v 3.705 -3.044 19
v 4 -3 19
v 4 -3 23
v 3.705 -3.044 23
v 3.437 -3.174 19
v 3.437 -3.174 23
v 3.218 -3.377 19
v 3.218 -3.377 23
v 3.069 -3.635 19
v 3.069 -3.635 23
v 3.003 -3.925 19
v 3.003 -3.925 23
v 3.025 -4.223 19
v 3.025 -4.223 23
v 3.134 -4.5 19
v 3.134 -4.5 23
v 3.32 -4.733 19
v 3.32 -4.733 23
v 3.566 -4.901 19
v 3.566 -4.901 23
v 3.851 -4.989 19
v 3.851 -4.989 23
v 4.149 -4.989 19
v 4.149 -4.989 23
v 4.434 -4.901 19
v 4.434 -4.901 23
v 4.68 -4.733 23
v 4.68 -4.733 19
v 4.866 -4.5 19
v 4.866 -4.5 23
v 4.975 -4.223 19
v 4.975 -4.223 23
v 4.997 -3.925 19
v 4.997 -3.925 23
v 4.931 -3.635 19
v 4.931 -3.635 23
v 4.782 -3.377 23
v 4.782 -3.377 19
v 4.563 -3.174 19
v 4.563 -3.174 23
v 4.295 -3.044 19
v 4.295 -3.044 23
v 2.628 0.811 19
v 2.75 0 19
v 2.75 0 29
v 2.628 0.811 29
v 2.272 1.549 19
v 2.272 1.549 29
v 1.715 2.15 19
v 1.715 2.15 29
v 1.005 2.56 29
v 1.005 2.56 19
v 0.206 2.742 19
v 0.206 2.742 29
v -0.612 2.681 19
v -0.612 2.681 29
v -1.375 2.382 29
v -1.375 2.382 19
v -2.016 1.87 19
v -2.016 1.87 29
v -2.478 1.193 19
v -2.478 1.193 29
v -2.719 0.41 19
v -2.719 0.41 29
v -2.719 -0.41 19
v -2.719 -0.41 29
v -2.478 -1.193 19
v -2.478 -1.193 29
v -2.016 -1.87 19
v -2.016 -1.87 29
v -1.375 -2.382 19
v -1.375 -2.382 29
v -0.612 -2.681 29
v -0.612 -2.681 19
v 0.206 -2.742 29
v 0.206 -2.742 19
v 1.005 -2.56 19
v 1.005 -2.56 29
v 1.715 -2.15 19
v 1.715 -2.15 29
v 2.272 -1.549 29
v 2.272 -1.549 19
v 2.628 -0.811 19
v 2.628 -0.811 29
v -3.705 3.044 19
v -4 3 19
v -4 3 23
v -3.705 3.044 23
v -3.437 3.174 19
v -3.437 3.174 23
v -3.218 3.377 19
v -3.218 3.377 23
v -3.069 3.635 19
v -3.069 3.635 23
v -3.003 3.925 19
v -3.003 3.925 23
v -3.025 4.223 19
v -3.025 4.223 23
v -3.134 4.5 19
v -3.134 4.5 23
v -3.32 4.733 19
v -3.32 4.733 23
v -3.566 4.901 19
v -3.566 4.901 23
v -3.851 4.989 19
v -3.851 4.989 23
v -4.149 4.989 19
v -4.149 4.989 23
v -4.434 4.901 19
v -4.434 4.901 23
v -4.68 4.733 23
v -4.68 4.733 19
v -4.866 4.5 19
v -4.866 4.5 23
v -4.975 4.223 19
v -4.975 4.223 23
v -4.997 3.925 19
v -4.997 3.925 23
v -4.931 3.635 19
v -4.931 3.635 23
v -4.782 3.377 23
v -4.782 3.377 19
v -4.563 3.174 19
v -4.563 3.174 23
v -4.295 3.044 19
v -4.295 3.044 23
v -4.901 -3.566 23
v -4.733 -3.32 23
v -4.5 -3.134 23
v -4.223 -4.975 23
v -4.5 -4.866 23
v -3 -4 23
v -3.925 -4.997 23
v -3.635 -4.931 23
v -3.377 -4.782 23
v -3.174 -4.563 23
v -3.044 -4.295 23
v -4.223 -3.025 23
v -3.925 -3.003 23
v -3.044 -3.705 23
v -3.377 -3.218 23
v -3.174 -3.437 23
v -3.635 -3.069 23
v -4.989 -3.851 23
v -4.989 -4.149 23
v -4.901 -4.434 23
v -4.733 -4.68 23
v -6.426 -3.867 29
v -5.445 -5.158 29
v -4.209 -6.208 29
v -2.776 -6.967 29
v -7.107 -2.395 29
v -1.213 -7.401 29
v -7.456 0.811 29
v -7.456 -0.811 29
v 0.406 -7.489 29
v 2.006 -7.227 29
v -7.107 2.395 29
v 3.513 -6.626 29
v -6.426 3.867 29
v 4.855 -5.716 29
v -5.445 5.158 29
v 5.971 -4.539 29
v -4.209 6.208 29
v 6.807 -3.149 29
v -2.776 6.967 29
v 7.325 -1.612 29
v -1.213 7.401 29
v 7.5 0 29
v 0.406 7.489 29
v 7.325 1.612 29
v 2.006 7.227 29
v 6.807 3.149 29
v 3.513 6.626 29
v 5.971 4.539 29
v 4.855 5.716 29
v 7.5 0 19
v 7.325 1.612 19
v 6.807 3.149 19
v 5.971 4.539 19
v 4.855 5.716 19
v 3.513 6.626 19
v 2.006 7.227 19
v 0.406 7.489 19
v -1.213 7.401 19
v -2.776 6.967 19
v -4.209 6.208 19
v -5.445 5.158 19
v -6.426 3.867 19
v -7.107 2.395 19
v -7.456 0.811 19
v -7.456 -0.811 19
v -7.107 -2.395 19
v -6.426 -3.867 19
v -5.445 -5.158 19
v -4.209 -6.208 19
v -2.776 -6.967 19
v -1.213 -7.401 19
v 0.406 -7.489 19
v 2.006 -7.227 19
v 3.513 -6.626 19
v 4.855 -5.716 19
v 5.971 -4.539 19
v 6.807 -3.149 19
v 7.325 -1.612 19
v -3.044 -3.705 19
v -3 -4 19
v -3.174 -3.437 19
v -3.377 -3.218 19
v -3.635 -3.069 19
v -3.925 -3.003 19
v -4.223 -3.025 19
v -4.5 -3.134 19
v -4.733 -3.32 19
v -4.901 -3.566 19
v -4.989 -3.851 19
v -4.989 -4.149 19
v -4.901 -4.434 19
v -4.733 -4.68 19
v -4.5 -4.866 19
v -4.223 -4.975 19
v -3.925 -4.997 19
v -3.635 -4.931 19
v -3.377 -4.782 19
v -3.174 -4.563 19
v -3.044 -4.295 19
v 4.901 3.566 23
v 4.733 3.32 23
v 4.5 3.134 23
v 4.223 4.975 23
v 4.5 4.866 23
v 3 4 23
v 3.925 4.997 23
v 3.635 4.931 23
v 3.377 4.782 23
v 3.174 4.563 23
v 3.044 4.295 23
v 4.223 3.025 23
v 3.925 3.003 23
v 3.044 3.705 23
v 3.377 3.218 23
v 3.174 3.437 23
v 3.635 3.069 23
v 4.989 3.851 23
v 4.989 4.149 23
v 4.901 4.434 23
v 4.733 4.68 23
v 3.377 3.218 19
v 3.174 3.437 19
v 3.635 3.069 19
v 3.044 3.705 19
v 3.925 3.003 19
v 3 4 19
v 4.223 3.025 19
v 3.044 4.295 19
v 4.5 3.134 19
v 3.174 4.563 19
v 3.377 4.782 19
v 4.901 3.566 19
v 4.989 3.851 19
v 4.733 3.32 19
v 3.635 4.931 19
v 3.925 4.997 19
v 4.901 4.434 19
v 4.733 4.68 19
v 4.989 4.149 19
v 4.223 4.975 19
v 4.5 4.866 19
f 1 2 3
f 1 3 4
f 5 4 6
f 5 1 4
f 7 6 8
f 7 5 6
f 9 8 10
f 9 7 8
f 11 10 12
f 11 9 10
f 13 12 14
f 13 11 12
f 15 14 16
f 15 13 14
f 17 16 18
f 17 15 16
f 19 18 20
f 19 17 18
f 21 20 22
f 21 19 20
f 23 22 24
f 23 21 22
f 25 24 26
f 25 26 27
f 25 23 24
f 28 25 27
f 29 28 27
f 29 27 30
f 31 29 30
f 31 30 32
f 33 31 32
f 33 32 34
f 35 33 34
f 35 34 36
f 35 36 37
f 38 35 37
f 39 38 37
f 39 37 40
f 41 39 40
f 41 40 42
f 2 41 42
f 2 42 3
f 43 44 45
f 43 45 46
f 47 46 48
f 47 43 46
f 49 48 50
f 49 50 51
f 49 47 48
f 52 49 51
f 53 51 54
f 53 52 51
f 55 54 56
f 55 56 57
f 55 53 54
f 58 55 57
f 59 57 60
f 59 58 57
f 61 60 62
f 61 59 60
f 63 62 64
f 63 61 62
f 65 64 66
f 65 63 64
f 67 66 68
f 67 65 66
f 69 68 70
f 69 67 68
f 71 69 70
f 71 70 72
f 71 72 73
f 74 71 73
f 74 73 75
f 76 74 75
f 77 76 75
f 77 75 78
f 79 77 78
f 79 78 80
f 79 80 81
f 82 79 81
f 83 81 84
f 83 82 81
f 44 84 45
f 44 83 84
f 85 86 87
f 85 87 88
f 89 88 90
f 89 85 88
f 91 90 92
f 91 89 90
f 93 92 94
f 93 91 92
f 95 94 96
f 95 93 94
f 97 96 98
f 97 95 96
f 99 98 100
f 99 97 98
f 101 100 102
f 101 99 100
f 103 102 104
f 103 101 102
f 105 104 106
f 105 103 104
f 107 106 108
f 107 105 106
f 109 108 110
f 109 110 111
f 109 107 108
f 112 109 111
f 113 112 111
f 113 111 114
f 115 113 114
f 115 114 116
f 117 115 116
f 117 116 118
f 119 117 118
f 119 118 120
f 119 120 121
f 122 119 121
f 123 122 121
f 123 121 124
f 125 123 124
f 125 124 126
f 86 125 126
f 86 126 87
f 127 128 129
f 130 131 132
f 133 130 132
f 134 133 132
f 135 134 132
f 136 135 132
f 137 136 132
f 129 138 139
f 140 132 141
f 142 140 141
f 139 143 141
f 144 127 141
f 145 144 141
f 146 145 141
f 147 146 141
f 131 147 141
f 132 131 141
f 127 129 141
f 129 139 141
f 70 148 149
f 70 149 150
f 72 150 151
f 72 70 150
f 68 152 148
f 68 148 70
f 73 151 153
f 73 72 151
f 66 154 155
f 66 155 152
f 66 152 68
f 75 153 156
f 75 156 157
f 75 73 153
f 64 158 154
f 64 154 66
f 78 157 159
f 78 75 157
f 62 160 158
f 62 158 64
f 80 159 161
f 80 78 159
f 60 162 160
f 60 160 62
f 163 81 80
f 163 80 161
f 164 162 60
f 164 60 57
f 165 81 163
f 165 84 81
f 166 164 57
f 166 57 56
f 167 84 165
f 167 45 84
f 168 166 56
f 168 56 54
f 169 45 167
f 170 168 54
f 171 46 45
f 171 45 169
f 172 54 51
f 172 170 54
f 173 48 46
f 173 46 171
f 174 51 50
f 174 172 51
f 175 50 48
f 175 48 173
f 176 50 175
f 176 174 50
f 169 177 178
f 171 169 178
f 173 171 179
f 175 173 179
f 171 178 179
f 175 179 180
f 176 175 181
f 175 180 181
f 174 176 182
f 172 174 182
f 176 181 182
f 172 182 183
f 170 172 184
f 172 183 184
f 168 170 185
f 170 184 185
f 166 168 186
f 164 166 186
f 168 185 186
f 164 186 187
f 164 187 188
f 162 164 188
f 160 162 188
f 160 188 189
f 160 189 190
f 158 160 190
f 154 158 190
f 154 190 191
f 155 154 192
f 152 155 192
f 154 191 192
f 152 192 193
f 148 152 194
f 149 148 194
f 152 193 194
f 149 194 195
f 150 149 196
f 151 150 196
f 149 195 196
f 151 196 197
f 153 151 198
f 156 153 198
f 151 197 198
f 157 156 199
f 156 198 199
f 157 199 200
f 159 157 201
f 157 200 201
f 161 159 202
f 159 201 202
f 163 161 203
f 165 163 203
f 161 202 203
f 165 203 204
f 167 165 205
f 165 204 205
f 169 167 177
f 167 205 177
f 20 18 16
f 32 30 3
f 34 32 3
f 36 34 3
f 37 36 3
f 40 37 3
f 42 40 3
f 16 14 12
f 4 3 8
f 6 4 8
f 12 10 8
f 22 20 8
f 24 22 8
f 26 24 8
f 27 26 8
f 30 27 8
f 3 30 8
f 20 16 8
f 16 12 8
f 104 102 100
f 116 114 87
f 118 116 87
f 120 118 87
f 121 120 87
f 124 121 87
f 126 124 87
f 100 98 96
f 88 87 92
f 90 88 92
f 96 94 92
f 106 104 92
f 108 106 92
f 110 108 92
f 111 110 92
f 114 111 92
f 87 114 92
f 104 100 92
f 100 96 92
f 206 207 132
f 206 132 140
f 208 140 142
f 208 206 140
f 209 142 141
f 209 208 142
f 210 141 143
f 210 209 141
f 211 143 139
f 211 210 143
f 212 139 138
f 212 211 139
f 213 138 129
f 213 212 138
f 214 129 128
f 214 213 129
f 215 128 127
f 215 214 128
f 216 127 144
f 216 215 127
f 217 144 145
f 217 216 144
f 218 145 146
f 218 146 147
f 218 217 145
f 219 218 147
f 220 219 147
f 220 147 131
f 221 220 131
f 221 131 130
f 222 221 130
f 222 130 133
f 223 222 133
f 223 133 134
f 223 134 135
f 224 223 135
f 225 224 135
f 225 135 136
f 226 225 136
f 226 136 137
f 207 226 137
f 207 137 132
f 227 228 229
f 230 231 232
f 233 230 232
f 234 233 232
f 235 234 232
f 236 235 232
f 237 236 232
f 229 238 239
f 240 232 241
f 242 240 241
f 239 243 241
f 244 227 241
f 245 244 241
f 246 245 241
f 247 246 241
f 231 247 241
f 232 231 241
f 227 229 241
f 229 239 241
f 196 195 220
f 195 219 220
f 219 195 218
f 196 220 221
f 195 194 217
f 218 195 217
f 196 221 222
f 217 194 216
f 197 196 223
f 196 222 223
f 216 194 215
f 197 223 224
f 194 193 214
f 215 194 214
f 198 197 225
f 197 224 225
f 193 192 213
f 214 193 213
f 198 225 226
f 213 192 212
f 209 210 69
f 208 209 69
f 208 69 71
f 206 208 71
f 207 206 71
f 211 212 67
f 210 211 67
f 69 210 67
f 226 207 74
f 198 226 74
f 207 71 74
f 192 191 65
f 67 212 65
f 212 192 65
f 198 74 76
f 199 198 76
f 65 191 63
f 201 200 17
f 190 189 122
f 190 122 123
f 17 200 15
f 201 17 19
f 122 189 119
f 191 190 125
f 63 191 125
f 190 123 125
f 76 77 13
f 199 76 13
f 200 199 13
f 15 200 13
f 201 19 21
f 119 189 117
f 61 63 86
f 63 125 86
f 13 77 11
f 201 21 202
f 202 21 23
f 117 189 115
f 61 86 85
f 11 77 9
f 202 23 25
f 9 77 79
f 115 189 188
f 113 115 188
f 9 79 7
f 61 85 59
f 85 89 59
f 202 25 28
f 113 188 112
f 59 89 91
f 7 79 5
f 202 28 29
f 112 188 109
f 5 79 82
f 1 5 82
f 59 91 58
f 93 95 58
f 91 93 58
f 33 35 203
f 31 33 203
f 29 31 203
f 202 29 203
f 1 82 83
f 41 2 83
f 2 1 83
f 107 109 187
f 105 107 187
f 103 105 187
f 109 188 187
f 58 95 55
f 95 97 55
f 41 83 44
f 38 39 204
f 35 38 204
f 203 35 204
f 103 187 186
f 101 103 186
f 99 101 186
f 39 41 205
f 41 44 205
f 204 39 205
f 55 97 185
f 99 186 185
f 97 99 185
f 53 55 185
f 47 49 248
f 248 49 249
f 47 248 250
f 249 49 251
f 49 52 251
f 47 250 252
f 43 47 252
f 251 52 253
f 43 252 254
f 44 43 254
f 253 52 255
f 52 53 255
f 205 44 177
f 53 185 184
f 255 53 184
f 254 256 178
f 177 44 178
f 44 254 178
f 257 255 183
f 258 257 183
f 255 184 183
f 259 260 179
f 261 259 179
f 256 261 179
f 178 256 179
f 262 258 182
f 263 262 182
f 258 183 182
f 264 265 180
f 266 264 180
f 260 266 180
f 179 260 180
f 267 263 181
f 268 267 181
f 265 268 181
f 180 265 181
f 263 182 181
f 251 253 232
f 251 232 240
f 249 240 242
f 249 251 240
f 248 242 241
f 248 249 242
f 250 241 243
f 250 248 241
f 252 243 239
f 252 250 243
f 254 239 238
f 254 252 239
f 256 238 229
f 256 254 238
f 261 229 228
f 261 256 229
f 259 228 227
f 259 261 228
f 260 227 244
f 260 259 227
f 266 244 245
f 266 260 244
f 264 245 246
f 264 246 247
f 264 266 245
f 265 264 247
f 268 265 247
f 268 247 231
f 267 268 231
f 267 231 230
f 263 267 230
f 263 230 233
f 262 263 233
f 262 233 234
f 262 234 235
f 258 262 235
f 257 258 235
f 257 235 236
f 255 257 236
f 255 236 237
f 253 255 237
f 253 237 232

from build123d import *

# Parameters (mm, degrees)
CYLINDER1349_R     = 1
CYLINDER1349_DEPTH = 20
CYLINDER1351_R     = 1
CYLINDER1351_DEPTH = 20
CYLINDER1352_R     = 1
CYLINDER1352_DEPTH = 20
CYLINDER1345_R     = 1
CYLINDER1345_DEPTH = 20
TUBE120_R          = 7.5
TUBE120_R_2        = 2.75
TUBE120_DEPTH      = 10


with BuildPart() as v_lec1349:
    # Cylinder1349 → Cylinder1349 (new body)
    with BuildSketch(Plane(origin=(4, -4, -88), x_dir=(0, 1, 0), z_dir=(0, 0, 1))):
        Circle(CYLINDER1349_R)
    extrude(amount=CYLINDER1349_DEPTH)


with BuildPart() as v_lec1351:
    # Cylinder1351 → Cylinder1351 (new body)
    with BuildSketch(Plane(origin=(4, 4, -88), x_dir=(-1, 0, 0), z_dir=(0, 0, 1))):
        Circle(CYLINDER1351_R)
    extrude(amount=CYLINDER1351_DEPTH)


with BuildPart() as v_lec1352:
    # Cylinder1352 → Cylinder1352 (new body)
    with BuildSketch(Plane(origin=(-4, 4, -88), x_dir=(0, -1, 0), z_dir=(0, 0, 1))):
        Circle(CYLINDER1352_R)
    extrude(amount=CYLINDER1352_DEPTH)


with BuildPart() as compound943:
    # Cylinder1345 → Cylinder1345 (new body)
    with BuildSketch(Plane(origin=(-4, -4, -88), x_dir=(1, 0, 0), z_dir=(0, 0, 1))):
        Circle(CYLINDER1345_R)
    extrude(amount=CYLINDER1345_DEPTH)

    # Compound943: union Válec1349, Válec1351, Válec1352
    add(v_lec1349.part)
    add(v_lec1351.part)
    add(v_lec1352.part)


with BuildPart() as compound943_1:
    # Compound943 placement: moved
    add(compound943.part.moved(Location((0, 0, 91))))


with BuildPart() as cut484:
    # Tube120 → Tube120 (new body)
    with BuildSketch(Plane.XY.offset(19)):
        Circle(TUBE120_R)
        Circle(TUBE120_R_2, mode=Mode.SUBTRACT)
    extrude(amount=TUBE120_DEPTH)

    # Cut484: cut Compound943
    add(compound943_1.part, mode=Mode.SUBTRACT)


solid = cut484.part
